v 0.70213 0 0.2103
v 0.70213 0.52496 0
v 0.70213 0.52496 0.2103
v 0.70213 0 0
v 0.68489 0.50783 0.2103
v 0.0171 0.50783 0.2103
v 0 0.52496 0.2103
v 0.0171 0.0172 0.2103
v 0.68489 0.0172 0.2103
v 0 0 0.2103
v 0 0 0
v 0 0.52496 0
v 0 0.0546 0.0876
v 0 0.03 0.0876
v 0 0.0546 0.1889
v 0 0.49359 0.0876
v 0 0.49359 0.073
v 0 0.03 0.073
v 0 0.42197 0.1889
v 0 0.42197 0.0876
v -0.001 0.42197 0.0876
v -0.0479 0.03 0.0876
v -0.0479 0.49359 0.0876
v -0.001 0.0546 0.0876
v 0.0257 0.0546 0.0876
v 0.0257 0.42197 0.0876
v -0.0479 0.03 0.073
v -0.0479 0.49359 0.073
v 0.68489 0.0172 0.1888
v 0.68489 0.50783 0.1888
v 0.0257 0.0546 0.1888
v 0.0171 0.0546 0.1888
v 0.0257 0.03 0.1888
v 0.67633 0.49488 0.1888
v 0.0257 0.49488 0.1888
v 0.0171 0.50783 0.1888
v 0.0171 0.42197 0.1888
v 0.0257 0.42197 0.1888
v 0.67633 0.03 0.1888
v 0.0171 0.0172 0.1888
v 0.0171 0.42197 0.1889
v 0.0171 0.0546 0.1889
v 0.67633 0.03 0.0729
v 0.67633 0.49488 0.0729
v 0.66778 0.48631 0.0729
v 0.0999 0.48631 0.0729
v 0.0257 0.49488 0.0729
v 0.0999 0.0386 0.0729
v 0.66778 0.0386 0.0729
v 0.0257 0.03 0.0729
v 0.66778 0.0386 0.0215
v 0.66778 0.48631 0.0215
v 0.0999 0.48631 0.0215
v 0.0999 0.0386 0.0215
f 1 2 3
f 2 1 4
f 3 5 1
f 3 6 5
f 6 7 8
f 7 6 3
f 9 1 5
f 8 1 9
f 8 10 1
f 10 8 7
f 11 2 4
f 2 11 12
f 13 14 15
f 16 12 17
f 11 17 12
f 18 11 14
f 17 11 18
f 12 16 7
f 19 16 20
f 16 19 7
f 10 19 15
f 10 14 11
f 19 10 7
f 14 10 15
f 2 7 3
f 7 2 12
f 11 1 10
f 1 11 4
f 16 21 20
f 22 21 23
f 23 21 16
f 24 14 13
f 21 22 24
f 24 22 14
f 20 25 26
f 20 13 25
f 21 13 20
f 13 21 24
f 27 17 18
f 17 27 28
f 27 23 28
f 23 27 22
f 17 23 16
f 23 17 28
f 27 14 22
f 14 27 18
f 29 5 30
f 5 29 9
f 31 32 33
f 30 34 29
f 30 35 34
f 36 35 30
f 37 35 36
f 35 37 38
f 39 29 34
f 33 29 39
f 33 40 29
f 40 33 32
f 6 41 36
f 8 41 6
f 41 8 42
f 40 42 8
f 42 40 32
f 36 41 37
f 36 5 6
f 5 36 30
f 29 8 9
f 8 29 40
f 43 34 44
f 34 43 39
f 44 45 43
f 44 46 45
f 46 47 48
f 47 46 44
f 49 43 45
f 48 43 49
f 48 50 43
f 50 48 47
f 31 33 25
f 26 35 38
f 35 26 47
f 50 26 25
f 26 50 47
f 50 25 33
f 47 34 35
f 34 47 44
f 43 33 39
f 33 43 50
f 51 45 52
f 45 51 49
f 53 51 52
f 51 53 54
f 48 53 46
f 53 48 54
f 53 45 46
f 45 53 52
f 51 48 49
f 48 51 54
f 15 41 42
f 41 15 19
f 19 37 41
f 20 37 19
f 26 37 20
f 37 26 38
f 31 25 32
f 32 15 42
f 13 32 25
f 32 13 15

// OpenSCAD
// Parameters
body_l = 0.702127;
body_w = 0.524964;
body_h = 0.2103;

top_l = 0.667793;
top_w = 0.490631;
top_inset_l = 0.0171;
top_inset_f = 0.0172;
top_z0 = 0.1888;
top_z1 = 0.2103;

mid_l = 0.650626;
mid_w = 0.46488;
mid_inset_l = 0.0257;
mid_inset_f = 0.03;
mid_z0 = 0.0729;
mid_z1 = 0.1888;

low_l = 0.567882;
low_w = 0.447713;
low_inset_l = 0.0999;
low_inset_f = 0.0386;
low_z0 = 0.0215;
low_z1 = 0.073;

proj_l = 0.130618;
proj_w = 0.463588;
proj_overhang = 0.0479;
proj_inset_f = 0.03;
proj_z0 = 0.073;
proj_z1 = 0.0876;

side_l = 0.0343;
side_w = 0.367372;
side_inset_f = 0.0546;
side_z0 = 0.0876;
side_z1 = 0.1889;

eps = 0.001;

module main_body() {
    cube([body_l, body_w, body_h]);
}

module side_projection() {
    translate([-proj_overhang, proj_inset_f, proj_z0])
        cube([proj_l, proj_w, proj_z1 - proj_z0]);
}

module top_recess() {
    translate([top_inset_l, top_inset_f, top_z0])
        cube([top_l, top_w, (top_z1 - top_z0) + eps]);
}

module mid_cut() {
    translate([mid_inset_l, mid_inset_f, mid_z0])
        cube([mid_l, mid_w, mid_z1 - mid_z0]);
}

module low_pocket() {
    translate([low_inset_l, low_inset_f, low_z0])
        cube([low_l, low_w, low_z1 - low_z0]);
}

module side_recess() {
    translate([-eps, side_inset_f, side_z0])
        cube([side_l + eps, side_w, side_z1 - side_z0]);
}

difference() {
    union() {
        main_body();
        side_projection();
    }
    top_recess();
    mid_cut();
    low_pocket();
    side_recess();
}
